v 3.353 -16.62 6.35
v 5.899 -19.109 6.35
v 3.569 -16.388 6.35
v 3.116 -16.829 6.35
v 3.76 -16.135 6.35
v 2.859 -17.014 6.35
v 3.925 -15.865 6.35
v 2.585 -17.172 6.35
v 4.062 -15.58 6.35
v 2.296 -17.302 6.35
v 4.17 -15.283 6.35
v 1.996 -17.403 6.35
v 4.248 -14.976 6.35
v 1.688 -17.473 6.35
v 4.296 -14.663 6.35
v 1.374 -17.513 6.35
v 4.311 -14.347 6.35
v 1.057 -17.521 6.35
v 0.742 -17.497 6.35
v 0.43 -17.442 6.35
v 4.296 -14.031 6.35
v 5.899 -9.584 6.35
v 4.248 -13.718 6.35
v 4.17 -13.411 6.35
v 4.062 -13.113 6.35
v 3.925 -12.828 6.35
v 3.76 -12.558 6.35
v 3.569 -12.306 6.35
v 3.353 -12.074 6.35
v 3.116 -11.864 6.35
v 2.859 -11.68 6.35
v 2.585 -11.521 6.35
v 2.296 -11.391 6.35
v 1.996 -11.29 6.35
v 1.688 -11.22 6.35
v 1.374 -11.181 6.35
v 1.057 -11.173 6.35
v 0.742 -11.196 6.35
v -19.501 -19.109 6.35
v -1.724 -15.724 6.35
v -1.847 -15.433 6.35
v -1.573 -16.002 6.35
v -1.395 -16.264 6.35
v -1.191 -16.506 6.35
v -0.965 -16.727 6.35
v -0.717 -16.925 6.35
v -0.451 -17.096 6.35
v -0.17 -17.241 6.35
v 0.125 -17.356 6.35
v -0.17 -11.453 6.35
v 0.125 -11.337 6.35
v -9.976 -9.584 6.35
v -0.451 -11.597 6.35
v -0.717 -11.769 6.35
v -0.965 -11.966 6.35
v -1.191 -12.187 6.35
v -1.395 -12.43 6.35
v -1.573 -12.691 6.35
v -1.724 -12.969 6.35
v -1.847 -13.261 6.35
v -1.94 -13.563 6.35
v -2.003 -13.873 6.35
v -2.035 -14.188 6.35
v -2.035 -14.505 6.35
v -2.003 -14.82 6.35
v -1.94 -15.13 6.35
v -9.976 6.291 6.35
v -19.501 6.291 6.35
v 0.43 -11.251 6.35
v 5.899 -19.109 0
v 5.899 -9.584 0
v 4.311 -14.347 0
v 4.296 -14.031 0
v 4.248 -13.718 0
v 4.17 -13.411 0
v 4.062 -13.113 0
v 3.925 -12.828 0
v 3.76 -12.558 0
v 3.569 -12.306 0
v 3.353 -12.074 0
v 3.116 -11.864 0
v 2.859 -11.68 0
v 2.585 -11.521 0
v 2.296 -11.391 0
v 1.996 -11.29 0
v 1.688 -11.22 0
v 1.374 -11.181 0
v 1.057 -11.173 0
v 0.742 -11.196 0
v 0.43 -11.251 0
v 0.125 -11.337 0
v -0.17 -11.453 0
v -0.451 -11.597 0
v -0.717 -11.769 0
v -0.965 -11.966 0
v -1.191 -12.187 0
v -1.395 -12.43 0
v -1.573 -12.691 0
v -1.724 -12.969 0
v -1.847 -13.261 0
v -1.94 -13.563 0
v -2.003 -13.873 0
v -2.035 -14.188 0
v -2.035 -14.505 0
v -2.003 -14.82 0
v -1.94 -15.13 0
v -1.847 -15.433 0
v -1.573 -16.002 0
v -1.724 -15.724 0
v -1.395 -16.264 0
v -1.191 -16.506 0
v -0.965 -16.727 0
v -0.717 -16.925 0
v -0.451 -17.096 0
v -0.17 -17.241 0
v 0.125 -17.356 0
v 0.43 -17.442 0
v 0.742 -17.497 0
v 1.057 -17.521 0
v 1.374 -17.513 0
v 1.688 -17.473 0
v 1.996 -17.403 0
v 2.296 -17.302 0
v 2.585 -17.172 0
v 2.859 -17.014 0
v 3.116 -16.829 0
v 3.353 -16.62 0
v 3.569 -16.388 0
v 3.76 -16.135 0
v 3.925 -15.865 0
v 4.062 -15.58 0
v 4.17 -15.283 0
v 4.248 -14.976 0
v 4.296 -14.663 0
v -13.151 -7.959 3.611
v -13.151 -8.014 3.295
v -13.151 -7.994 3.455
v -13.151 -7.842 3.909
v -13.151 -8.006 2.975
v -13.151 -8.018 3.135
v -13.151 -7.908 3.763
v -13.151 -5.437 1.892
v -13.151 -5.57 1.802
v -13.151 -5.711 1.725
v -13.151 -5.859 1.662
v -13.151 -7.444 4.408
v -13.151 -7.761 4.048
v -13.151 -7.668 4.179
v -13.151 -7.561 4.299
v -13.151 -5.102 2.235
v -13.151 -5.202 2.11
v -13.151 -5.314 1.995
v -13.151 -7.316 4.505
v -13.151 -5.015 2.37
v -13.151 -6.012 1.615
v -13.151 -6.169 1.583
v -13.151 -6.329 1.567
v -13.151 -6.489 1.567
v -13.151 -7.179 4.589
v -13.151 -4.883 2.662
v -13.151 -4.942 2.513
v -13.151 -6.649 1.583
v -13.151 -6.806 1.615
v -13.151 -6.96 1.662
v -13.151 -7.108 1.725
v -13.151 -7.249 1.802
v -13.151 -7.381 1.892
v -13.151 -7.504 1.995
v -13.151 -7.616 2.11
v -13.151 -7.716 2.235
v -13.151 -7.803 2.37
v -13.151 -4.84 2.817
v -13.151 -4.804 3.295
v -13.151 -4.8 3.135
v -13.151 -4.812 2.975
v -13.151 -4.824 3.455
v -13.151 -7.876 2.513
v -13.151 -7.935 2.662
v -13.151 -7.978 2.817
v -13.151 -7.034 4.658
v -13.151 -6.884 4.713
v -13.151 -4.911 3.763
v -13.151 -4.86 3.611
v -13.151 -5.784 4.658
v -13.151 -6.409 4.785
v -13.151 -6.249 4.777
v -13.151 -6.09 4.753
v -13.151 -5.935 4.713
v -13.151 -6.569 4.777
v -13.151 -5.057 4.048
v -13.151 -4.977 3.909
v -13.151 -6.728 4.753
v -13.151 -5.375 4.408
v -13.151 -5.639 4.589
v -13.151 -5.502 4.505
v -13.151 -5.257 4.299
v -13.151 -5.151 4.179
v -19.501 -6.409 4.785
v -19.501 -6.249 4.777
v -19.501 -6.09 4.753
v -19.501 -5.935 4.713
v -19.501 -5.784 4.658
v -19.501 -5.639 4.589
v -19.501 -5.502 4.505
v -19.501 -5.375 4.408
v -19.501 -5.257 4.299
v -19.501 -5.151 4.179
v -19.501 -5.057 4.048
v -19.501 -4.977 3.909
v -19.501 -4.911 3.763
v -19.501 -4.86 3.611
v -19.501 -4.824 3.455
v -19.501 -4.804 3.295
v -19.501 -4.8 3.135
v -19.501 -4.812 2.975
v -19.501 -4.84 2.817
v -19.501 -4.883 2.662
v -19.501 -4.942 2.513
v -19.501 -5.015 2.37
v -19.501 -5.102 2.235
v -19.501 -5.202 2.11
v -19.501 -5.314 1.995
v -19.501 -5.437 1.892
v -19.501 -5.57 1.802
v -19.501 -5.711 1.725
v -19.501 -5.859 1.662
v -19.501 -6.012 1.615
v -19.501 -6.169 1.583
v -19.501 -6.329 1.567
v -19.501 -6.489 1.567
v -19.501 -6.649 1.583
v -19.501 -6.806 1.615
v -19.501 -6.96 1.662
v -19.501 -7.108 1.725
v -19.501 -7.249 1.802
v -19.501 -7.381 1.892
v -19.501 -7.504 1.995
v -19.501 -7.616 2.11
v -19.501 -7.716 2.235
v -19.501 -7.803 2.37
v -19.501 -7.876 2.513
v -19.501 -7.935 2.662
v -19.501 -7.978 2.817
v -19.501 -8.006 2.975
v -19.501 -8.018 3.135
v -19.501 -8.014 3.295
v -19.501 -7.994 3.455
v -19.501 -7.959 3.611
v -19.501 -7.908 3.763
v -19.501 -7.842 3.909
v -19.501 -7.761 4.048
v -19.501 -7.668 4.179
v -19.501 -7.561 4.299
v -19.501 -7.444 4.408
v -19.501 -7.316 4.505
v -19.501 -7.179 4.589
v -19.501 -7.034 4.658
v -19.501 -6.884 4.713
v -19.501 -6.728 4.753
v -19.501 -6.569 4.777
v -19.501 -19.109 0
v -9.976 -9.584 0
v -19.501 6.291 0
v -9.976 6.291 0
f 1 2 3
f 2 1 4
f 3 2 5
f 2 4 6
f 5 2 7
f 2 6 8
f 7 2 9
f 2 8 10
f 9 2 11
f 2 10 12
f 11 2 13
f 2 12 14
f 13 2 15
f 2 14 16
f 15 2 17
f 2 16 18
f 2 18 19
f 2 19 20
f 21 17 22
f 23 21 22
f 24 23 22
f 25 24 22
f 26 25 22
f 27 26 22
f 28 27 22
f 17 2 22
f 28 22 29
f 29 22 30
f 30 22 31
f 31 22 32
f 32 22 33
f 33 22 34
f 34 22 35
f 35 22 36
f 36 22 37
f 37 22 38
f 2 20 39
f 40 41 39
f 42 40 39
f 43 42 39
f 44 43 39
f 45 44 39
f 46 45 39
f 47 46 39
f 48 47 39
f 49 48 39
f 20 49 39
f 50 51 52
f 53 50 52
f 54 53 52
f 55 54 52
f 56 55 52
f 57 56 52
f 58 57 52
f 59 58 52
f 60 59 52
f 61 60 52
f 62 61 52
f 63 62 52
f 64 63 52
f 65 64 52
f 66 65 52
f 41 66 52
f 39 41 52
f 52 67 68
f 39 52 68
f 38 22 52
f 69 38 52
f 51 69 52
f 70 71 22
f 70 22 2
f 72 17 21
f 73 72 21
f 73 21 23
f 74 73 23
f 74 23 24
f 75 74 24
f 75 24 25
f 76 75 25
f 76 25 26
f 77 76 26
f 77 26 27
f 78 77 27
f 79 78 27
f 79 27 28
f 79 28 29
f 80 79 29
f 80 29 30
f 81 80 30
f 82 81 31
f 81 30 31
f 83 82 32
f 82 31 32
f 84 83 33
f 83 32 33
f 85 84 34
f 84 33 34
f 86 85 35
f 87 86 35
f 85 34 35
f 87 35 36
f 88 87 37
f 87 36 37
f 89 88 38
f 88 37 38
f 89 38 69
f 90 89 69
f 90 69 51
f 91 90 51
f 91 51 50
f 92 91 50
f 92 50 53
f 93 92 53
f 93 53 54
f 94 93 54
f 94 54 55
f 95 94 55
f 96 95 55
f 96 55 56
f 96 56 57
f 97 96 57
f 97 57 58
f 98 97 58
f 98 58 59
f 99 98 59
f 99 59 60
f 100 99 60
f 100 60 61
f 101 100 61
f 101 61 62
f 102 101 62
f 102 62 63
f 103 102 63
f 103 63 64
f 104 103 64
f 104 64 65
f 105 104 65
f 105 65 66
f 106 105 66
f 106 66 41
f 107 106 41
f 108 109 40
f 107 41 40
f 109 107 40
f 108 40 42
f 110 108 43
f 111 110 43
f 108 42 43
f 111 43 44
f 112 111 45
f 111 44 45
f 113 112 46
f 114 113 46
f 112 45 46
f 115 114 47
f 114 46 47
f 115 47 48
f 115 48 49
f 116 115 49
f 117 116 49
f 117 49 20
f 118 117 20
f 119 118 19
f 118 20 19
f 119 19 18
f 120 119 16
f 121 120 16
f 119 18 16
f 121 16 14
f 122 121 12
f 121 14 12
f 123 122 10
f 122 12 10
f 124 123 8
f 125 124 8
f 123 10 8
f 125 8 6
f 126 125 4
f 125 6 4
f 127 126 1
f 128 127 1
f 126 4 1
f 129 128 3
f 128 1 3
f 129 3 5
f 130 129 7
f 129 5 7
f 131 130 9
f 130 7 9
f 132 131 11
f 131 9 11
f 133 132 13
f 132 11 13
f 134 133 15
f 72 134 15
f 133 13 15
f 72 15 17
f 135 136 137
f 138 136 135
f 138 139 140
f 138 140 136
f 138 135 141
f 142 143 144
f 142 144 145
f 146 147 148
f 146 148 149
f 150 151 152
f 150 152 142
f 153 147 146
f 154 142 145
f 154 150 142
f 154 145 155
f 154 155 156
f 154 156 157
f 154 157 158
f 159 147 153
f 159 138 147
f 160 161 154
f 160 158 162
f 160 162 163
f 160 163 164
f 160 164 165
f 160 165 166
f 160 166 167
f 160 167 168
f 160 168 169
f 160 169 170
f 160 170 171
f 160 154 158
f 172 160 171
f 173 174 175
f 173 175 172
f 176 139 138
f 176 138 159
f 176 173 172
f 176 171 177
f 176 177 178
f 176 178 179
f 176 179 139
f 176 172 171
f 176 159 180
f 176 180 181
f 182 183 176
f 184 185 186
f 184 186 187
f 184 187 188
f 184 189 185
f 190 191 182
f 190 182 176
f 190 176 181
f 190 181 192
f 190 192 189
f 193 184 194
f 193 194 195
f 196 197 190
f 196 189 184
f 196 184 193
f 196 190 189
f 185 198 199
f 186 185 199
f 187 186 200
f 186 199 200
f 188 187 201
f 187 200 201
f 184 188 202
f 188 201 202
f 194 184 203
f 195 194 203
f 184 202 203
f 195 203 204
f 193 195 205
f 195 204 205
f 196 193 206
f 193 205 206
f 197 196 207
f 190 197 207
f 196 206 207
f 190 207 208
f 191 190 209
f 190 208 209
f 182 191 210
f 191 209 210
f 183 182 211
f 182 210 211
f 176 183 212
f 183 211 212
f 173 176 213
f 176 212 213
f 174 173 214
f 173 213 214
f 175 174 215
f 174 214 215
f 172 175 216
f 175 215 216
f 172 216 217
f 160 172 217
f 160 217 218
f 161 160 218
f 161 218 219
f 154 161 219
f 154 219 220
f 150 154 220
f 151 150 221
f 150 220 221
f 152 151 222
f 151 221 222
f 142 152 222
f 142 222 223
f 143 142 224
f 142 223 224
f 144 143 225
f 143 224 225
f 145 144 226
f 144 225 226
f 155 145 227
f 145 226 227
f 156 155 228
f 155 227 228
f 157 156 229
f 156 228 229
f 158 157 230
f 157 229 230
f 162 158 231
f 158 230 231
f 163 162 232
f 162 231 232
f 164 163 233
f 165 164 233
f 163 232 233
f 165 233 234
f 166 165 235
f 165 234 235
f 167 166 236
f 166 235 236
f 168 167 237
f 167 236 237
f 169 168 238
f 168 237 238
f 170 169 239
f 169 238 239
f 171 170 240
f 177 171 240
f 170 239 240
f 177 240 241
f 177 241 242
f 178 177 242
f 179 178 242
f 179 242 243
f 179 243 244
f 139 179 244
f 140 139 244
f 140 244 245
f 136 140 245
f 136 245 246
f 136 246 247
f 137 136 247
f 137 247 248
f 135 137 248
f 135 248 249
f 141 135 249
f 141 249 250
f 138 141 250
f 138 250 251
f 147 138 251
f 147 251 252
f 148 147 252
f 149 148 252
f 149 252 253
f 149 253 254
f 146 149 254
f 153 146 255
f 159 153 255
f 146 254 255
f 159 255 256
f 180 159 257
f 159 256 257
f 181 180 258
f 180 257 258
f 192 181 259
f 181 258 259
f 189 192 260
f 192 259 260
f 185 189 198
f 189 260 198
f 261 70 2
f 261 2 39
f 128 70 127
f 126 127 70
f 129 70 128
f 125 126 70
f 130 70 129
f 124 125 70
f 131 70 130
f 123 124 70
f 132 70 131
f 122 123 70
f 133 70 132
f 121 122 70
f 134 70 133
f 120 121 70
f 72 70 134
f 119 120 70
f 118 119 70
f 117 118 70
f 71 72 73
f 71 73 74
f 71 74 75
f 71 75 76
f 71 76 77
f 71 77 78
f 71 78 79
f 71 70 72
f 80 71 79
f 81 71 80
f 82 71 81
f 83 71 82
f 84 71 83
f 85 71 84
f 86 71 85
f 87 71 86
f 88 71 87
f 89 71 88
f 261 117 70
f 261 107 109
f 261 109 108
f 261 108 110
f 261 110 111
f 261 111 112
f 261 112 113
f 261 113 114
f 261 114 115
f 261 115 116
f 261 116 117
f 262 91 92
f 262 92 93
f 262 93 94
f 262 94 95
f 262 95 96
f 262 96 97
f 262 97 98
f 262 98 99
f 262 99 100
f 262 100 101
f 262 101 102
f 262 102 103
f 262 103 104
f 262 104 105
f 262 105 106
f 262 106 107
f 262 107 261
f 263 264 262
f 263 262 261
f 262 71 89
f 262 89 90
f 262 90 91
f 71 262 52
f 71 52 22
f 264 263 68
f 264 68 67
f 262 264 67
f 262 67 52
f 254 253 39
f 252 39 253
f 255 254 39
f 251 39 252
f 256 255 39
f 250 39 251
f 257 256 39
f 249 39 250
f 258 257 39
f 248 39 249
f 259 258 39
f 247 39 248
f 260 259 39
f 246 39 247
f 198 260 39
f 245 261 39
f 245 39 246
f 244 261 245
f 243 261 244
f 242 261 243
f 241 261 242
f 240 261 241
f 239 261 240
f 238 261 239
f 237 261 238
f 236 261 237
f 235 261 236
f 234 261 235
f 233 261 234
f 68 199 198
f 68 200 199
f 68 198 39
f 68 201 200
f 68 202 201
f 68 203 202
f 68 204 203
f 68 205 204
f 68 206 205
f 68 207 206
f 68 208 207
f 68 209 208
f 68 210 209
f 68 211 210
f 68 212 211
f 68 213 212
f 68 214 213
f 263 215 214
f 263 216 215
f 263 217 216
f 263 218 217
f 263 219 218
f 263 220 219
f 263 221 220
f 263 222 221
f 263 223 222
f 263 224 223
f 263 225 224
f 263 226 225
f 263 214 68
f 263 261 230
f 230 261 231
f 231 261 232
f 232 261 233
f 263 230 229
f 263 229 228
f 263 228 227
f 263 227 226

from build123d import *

# Parameters (mm, degrees)
EXTRUDE1_DEPTH     = 6.35
SKETCH2_R          = 3.175
CUT_EXTRUDE1_DEPTH = 7.35
SKETCH3_R          = 1.609646759
CUT_EXTRUDE2_DEPTH = 6.35


with BuildPart() as part:
    # Sketch1 → Extrude1 (new body)
    with BuildSketch(Plane.XY):
        Polygon((-19.501167272, 6.290815989), (-9.976167272, 6.290815989), (-9.976167272, -9.584184011), (5.898832728, -9.584184011), (5.898832728, -19.109184011), (-19.501167272, -19.109184011), align=None)
    extrude(amount=EXTRUDE1_DEPTH)

    # Sketch2 → Cut-Extrude1 (cut, through all)
    with BuildSketch(Plane.XY.offset(6.35)):
        with Locations((1.136332728, -14.346684011)):
            Circle(SKETCH2_R)
    extrude(amount=-CUT_EXTRUDE1_DEPTH, mode=Mode.SUBTRACT)

    # Sketch3 → Cut-Extrude2 (cut)
    with BuildSketch(Plane.ZY.offset(19.501167272)):
        with Locations((3.175, -6.409184011)):
            Circle(SKETCH3_R)
    extrude(amount=-CUT_EXTRUDE2_DEPTH, mode=Mode.SUBTRACT)


solid = part.part
